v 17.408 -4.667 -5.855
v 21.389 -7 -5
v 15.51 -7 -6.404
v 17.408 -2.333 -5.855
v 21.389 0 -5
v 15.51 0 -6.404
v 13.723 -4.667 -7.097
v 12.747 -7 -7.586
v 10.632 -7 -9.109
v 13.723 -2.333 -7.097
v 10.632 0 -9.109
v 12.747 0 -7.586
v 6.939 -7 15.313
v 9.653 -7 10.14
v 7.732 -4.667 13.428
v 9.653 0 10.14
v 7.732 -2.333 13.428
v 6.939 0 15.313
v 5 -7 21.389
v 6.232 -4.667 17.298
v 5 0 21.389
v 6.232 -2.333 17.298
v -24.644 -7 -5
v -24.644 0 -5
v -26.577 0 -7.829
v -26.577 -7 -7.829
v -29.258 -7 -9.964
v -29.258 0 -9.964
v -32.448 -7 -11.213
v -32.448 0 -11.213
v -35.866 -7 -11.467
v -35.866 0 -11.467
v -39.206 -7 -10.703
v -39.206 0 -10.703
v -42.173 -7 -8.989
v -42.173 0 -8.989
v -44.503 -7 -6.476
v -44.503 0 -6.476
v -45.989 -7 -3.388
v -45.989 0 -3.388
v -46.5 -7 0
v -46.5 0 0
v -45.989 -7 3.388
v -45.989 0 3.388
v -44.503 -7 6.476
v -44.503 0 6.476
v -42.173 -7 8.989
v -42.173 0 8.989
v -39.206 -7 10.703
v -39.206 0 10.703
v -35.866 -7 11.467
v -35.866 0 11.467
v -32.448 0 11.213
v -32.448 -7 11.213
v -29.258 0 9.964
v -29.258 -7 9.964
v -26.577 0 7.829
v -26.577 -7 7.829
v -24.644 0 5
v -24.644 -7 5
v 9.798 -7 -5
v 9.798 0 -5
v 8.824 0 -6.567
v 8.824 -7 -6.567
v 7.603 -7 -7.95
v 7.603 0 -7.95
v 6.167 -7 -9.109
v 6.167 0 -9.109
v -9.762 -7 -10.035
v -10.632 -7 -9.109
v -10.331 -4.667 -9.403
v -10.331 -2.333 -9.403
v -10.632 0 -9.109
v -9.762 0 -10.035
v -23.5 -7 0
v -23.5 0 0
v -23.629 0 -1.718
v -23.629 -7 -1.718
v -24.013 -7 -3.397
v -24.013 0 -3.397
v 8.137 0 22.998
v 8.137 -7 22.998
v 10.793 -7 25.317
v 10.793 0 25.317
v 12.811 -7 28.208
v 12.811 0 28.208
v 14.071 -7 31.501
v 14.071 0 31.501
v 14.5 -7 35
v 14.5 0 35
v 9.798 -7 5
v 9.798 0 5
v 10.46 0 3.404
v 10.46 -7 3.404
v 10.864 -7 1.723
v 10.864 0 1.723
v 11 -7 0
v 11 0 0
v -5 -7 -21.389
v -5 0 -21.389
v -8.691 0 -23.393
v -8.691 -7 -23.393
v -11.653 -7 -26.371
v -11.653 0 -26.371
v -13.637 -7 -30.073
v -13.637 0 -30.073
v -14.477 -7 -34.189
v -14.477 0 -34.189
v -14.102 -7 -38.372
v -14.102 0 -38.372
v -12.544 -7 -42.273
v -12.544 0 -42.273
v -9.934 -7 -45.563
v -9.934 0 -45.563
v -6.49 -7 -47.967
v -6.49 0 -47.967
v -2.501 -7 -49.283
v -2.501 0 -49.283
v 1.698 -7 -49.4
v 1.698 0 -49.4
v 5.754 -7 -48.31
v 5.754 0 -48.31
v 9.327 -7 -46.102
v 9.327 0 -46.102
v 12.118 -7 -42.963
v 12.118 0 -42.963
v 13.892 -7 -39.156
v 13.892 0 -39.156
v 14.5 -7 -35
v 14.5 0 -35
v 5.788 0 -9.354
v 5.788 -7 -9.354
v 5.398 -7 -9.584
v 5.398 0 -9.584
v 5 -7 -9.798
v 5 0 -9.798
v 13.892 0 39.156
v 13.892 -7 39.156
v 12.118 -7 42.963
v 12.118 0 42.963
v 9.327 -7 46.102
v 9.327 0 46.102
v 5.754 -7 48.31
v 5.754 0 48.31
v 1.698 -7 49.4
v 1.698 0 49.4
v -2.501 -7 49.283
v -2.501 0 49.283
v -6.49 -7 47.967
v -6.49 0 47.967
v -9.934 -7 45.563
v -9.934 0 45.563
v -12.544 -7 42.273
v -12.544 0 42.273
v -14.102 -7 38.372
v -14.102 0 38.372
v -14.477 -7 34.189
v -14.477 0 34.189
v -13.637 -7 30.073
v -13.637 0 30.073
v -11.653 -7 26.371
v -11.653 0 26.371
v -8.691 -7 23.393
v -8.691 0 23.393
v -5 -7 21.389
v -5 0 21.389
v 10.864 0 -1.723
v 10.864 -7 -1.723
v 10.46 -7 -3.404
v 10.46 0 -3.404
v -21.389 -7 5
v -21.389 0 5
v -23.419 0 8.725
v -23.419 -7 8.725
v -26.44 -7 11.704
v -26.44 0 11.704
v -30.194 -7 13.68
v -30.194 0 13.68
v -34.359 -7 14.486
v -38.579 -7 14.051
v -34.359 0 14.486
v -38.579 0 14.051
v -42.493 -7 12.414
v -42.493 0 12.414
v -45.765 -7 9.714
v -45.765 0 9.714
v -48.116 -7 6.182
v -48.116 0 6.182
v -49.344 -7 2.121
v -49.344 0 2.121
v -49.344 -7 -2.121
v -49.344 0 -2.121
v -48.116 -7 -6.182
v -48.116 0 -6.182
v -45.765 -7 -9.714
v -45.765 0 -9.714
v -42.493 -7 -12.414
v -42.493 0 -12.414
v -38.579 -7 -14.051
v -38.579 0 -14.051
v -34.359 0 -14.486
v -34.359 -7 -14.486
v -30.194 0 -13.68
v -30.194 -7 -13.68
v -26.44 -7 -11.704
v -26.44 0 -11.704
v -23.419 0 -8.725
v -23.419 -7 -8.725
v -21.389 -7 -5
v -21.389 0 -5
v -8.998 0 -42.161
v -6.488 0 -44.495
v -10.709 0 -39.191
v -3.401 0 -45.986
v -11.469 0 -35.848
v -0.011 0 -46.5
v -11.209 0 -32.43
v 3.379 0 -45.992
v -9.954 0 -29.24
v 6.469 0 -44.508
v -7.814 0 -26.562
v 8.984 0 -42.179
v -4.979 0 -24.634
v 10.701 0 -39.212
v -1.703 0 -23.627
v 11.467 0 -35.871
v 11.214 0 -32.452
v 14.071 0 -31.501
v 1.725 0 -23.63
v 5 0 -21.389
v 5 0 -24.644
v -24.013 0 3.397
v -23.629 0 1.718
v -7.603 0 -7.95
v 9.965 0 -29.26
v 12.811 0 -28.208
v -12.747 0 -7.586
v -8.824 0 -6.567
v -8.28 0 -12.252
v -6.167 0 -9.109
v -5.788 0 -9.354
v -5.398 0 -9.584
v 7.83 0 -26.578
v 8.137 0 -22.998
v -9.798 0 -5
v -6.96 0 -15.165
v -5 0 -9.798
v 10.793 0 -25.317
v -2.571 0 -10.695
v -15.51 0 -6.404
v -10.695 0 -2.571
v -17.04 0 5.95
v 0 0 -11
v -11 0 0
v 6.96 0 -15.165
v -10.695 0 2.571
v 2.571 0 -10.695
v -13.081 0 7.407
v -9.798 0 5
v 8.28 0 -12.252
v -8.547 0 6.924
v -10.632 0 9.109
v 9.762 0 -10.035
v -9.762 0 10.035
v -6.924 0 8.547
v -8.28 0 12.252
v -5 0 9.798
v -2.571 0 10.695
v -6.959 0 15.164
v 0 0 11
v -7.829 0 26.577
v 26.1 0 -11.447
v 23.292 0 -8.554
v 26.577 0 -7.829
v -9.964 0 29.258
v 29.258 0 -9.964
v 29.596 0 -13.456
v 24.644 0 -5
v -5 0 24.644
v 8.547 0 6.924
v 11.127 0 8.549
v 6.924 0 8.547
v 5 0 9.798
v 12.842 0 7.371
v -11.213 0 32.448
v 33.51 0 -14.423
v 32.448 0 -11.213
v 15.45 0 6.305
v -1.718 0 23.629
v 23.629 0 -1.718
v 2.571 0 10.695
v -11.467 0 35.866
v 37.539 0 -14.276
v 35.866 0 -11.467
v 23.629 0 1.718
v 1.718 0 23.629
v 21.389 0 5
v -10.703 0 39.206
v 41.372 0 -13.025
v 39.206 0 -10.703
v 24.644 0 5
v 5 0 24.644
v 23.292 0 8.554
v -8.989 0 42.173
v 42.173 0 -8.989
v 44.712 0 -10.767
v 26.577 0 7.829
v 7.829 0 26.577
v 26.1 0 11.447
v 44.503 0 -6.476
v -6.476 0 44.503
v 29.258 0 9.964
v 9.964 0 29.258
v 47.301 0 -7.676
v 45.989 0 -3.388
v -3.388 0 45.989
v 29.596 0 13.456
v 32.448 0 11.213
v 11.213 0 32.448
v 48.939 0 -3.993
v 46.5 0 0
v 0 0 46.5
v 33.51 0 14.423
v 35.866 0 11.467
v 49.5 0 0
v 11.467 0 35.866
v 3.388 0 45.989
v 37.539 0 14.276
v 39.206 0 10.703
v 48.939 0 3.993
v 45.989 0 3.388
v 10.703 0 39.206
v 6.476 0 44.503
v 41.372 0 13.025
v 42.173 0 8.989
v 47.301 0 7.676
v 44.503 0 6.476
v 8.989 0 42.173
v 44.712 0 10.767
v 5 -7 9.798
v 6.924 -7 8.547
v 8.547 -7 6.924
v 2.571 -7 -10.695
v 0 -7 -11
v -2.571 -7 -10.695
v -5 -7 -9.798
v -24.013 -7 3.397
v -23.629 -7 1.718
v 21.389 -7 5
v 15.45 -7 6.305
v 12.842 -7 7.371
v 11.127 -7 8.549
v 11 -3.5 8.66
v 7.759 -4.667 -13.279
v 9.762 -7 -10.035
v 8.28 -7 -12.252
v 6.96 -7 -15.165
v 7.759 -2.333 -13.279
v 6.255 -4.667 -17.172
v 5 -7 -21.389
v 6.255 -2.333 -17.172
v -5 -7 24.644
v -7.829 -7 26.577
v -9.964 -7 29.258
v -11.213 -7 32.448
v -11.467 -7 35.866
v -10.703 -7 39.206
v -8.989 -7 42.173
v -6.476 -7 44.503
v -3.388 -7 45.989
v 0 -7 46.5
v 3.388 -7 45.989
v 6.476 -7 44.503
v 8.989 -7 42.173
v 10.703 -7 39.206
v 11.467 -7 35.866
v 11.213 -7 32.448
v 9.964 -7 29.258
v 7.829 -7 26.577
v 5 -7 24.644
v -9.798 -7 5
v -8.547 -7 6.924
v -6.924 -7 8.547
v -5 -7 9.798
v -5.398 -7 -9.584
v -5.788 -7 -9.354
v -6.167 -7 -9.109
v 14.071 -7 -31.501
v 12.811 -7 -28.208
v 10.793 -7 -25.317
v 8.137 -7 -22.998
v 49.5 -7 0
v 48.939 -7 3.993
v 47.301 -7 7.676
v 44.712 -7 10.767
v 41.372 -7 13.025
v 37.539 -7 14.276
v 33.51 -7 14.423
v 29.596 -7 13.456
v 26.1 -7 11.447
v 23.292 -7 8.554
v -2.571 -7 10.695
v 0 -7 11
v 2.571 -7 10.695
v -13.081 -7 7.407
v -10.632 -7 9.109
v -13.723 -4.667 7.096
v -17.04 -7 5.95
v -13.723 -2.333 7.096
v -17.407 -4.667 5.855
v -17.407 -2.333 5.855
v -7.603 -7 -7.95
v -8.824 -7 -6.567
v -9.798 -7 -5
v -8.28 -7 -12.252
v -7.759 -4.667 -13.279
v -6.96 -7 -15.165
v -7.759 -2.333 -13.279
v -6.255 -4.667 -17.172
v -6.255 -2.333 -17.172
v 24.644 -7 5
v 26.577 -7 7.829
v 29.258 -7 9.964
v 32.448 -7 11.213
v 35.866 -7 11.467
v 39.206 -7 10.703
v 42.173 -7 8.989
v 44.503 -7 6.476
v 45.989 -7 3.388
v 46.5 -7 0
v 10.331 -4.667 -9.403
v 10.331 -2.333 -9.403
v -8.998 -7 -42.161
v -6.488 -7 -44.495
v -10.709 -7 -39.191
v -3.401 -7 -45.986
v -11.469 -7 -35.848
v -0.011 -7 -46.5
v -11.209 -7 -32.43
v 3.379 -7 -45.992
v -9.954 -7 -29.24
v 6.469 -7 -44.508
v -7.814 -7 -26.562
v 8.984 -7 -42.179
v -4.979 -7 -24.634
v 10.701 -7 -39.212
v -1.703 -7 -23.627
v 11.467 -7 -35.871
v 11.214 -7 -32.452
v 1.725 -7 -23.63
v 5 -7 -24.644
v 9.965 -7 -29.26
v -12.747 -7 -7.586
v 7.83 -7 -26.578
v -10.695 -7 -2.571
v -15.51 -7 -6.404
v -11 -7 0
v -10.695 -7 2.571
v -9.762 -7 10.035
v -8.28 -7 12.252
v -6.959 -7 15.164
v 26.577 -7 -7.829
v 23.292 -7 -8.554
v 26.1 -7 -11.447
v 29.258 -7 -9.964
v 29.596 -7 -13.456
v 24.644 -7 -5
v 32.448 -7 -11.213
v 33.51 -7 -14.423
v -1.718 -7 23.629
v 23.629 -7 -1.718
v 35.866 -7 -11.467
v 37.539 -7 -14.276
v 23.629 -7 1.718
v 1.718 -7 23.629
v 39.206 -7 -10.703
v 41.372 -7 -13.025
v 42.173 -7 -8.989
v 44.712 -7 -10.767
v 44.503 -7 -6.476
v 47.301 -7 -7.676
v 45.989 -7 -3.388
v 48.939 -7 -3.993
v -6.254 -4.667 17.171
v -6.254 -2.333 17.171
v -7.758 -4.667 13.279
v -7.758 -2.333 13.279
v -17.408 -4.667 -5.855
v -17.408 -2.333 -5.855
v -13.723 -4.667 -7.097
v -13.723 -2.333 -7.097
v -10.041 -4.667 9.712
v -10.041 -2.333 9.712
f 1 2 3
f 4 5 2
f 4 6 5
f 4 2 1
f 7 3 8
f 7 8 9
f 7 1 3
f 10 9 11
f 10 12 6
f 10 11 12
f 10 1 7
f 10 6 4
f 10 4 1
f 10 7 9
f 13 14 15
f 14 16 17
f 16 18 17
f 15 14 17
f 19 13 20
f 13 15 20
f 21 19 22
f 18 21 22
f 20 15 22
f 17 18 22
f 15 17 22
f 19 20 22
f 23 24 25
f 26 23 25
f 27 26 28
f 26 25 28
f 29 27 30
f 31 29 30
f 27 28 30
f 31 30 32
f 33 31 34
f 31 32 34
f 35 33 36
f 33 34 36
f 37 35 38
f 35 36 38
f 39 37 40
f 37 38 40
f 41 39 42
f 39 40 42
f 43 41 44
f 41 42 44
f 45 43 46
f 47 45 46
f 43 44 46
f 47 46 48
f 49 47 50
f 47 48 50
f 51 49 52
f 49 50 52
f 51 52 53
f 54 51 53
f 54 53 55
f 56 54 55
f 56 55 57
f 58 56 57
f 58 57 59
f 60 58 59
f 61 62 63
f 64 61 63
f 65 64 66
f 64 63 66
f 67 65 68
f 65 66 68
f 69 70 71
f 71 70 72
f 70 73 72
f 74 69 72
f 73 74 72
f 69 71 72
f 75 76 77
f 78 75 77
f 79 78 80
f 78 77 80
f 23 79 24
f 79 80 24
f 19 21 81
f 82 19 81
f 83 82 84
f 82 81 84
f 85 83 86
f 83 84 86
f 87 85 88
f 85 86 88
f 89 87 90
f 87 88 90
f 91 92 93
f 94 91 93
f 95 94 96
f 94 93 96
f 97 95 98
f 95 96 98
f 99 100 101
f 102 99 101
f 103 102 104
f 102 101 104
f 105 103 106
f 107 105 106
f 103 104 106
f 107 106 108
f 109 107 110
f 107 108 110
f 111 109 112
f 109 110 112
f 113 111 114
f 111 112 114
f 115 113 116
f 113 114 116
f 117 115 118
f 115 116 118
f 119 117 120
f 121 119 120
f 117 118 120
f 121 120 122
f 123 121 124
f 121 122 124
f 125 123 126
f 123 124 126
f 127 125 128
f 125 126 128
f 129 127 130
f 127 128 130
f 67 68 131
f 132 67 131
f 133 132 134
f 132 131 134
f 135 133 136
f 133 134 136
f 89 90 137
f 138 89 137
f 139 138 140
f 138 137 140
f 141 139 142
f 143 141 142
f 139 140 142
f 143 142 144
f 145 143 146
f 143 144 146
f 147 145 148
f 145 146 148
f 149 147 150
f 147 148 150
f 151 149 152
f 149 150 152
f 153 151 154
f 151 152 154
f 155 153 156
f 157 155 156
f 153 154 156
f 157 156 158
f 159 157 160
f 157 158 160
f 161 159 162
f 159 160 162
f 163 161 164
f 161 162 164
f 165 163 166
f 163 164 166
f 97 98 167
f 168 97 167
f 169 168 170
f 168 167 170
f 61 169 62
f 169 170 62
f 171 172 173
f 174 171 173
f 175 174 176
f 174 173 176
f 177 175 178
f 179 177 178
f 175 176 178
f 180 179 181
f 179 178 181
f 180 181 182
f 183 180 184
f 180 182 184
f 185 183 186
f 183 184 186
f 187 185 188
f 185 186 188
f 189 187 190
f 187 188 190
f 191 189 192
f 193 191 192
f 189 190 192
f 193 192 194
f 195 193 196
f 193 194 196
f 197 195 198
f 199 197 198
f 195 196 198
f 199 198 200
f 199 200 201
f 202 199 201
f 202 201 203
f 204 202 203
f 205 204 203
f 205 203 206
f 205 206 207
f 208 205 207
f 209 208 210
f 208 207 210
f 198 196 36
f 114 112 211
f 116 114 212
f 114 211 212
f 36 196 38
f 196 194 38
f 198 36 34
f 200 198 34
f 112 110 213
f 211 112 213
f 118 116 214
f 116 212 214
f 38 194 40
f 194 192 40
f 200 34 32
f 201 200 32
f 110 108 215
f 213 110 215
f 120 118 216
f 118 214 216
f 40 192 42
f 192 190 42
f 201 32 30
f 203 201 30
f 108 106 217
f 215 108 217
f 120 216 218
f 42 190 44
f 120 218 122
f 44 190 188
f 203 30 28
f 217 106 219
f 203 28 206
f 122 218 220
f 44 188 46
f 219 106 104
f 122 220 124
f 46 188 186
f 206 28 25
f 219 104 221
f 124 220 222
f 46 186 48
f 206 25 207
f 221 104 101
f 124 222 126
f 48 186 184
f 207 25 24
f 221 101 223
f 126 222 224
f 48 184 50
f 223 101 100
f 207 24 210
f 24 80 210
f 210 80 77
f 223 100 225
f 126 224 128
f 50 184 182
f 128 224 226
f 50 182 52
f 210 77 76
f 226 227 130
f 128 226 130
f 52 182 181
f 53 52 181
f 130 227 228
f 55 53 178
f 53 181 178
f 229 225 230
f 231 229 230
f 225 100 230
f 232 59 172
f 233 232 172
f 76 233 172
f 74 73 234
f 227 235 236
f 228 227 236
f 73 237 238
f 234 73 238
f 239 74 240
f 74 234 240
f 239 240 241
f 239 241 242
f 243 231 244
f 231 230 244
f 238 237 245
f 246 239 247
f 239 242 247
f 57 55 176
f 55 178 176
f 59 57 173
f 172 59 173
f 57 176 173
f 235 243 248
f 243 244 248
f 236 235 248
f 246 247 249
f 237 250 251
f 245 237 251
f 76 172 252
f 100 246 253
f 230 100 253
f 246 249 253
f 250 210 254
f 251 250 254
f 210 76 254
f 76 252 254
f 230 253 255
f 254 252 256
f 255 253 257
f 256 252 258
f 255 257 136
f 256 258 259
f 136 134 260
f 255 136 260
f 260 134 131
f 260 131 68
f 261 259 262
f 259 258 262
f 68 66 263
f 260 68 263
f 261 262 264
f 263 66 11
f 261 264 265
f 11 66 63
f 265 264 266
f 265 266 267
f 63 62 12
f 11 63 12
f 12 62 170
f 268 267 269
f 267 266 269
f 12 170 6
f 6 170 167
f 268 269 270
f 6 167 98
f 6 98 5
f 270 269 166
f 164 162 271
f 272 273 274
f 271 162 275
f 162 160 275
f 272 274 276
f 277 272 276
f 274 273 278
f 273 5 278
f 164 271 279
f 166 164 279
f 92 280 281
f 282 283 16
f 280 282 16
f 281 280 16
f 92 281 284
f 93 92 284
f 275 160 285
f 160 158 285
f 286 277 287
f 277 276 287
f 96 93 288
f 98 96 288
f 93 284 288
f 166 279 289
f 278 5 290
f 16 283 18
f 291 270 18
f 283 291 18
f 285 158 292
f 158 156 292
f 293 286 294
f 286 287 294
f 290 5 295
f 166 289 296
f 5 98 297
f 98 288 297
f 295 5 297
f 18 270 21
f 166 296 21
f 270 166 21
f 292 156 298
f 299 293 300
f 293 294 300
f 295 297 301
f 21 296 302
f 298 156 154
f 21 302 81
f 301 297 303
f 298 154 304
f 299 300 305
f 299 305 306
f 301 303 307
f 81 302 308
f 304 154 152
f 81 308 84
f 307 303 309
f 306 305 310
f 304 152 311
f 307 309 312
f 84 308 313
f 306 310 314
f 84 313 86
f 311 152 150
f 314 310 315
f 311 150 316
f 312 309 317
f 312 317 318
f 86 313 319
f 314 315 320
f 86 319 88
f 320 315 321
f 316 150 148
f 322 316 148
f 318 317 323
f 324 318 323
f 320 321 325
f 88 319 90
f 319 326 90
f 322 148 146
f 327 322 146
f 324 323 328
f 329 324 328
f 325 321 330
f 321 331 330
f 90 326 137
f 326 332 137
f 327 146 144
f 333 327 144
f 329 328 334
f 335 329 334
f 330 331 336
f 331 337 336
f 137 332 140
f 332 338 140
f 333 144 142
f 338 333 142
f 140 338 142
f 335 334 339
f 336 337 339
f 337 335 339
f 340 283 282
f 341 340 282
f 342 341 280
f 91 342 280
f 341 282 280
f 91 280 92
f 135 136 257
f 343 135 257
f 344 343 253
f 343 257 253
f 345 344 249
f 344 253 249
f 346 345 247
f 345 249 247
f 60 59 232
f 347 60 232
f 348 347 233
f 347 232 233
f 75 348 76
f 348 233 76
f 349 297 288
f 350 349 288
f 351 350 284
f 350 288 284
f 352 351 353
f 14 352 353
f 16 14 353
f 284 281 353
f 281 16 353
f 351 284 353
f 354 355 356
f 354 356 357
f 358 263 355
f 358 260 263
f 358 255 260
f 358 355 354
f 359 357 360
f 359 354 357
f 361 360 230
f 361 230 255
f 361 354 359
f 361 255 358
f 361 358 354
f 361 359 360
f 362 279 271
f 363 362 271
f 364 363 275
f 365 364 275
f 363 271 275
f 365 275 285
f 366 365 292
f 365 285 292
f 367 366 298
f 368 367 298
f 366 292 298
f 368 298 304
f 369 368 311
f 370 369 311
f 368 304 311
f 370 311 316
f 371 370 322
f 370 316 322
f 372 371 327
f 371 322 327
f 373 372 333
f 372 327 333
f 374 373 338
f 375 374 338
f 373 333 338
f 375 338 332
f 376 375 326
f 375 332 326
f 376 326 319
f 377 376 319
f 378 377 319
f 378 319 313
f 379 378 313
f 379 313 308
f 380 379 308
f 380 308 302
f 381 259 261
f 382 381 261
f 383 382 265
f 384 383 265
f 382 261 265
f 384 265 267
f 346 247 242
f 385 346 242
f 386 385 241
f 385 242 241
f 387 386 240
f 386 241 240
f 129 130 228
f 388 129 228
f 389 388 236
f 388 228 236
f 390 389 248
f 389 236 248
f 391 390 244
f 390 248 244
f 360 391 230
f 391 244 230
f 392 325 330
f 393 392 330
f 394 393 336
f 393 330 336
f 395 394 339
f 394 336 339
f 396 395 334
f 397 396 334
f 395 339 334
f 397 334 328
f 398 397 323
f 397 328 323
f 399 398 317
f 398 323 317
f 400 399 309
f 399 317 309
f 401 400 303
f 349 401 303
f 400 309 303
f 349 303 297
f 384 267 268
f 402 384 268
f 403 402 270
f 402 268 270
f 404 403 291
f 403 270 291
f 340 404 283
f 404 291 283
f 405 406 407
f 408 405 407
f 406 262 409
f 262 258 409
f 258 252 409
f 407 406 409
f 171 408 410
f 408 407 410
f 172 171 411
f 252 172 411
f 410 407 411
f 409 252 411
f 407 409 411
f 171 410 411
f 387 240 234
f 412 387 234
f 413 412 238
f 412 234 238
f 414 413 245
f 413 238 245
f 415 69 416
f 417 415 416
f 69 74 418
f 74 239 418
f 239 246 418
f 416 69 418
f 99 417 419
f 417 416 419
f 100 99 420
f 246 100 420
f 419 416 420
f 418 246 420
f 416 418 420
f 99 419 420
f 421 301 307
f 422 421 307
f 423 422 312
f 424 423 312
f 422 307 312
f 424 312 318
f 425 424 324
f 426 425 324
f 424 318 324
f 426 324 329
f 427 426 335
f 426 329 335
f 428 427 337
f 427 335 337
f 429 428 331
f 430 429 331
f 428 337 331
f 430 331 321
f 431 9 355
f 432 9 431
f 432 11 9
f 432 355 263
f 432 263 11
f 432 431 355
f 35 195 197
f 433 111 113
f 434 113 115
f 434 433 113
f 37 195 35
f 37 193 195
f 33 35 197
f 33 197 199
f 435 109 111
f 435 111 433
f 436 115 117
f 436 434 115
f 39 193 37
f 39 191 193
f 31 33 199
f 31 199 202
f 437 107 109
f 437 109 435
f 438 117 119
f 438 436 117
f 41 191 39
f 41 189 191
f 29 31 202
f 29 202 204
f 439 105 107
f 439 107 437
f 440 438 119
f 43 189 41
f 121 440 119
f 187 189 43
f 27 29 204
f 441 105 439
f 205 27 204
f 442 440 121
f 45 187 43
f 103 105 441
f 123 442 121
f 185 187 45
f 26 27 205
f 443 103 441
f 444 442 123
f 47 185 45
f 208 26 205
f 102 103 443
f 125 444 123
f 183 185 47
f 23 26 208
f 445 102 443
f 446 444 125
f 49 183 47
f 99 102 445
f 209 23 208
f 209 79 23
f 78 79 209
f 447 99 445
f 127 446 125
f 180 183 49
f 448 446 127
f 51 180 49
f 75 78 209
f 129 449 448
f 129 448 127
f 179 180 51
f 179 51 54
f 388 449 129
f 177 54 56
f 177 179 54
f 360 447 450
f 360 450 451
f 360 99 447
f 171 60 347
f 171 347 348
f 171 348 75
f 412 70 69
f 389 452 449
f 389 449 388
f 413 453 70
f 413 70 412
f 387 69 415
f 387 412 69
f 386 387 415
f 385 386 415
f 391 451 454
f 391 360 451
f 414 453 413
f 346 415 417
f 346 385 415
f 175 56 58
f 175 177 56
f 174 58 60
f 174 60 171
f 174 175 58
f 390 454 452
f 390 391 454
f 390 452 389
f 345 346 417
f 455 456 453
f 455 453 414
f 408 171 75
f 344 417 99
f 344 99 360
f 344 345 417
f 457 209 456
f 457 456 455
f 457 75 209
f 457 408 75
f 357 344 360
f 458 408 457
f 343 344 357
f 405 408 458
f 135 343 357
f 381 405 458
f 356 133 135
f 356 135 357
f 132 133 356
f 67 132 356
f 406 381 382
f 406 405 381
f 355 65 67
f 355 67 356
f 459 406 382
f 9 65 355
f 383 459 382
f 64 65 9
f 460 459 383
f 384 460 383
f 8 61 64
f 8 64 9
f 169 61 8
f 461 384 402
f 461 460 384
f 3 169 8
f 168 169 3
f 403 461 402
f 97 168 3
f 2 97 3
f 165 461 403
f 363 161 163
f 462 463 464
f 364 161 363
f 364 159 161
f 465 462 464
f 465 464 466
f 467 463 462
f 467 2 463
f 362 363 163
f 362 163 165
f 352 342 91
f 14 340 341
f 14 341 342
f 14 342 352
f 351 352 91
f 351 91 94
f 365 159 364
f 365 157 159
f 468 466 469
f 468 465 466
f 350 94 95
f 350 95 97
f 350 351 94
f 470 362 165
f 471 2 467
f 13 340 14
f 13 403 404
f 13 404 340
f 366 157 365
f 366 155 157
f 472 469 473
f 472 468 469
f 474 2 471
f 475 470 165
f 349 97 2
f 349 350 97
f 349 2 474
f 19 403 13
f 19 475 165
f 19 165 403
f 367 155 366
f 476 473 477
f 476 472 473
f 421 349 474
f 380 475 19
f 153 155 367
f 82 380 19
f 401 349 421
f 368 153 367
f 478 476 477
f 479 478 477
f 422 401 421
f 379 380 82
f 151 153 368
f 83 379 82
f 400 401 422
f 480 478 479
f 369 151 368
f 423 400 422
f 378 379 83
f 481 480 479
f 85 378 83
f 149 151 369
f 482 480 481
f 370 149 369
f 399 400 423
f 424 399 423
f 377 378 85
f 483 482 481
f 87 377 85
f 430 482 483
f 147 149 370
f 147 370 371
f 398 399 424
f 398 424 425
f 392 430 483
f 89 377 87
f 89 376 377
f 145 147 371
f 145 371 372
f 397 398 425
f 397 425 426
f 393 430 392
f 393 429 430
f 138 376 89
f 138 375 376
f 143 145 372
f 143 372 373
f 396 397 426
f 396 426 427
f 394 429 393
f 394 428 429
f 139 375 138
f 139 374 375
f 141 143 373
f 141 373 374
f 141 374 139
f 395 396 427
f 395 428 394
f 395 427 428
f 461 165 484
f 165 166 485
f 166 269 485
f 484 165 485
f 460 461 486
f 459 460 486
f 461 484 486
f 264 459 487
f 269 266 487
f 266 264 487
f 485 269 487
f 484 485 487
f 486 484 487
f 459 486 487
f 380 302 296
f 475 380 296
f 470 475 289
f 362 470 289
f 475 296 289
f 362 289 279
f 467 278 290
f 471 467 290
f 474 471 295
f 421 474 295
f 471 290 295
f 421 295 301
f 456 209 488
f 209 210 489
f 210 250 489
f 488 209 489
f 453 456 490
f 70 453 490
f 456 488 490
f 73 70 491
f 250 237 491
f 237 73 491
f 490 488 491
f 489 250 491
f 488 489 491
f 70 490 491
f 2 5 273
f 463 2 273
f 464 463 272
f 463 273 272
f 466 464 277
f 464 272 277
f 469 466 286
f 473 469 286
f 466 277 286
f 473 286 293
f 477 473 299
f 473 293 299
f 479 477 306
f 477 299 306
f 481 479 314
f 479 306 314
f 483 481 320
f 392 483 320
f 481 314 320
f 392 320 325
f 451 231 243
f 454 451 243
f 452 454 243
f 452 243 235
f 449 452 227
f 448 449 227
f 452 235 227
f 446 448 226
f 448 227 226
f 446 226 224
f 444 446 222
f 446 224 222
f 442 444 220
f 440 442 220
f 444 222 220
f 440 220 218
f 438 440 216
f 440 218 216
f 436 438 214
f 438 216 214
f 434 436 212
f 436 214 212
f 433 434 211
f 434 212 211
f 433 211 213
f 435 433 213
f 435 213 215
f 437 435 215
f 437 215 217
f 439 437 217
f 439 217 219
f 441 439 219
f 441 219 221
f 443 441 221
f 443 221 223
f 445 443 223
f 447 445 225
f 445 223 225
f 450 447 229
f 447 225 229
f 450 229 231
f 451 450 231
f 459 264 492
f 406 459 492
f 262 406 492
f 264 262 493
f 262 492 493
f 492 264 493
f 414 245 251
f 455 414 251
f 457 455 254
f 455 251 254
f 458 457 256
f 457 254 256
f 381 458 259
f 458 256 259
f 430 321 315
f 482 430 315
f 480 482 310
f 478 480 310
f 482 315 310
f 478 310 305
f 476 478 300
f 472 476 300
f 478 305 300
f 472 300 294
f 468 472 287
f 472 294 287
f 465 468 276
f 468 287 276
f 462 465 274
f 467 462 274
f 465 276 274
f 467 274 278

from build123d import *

# Parameters (mm, degrees)
F1_DEPTH = 7


with BuildPart() as f1:
    # F0 (on Front) → F1 (new body)
    with BuildSketch(Plane.XZ):
        with BuildLine():
            ThreePointArc((9.7979589711, 5), (10.695268783, 2.5712303784), (11, 0))
            ThreePointArc((11, 0), (10.695268783, -2.5712303784), (9.7979589711, -5))
            Line((9.7979589711, -5), (13.0766968306, -5))
            ThreePointArc((13.0766968306, -5), (13.7672392953, -2.542267135), (14, 0))
            ThreePointArc((14, 0), (13.7672392953, 2.542267135), (13.0766968306, 5))
            Line((13.0766968306, 5), (9.7979589711, 5))
        make_face()
        with BuildLine():
            ThreePointArc((5, 9.7979589711), (7.7781745931, 7.7781745931), (9.7979589711, 5))
            Line((9.7979589711, 5), (13.0766968306, 5))
            ThreePointArc((13.0766968306, 5), (12.1766661067, 6.9086035149), (11, 8.6602540378))
            add(Edge.make_bspline(
                [(11, 8.6602540378), (10.5165329788, 9.0943534866), (10.069073109, 9.5914231948), (9.6528657807, 10.1401273276)],
                knots=[0.4694223133, 0.4694223133, 0.4694223133, 0.4694223133, 0.5544432682, 0.5544432682, 0.5544432682, 0.5544432682], degree=3))
            ThreePointArc((9.6528657807, 10.1401273276), (7.4721134232, 11.8392365037), (5, 13.0766968306))
            Line((5, 13.0766968306), (5, 9.7979589711))
        make_face()
        with BuildLine():
            Line((13.0766968306, -5), (9.7979589711, -5))
            ThreePointArc((9.7979589711, -5), (8.2425593884, -7.2842442798), (6.166922169, -9.1087359694))
            Line((6.166922169, -9.1087359694), (10.6316004928, -9.1087359694))
            ThreePointArc((10.6316004928, -9.1087359694), (12.0308465334, -7.1595203533), (13.0766968306, -5))
        make_face()
        with BuildLine():
            ThreePointArc((-5, 9.7979589711), (0, 11), (5, 9.7979589711))
            Line((5, 9.7979589711), (5, 13.0766968306))
            ThreePointArc((5, 13.0766968306), (0, 14), (-5, 13.0766968306))
            Line((-5, 13.0766968306), (-5, 9.7979589711))
        make_face()
        with BuildLine():
            ThreePointArc((11, 8.6602540378), (12.1766661067, 6.9086035149), (13.0766968306, 5))
            Line((13.0766968306, 5), (21.3893424112, 5))
            add(Edge.make_bspline(
                [(21.3893424112, 5), (17.4363397181, 5.7863082094), (13.6693443727, 6.2634805868), (11, 8.6602540378)],
                knots=[0, 0, 0, 0, 0.4694223133, 0.4694223133, 0.4694223133, 0.4694223133], degree=3))
        make_face()
        with BuildLine():
            Line((21.3893424112, 5), (13.0766968306, 5))
            ThreePointArc((13.0766968306, 5), (13.7672392953, 2.542267135), (14, 0))
            ThreePointArc((14, 0), (13.7672392953, -2.542267135), (13.0766968306, -5))
            Line((13.0766968306, -5), (21.3893424112, -5))
            ThreePointArc((21.3893424112, -5), (20.5, 0), (21.3893424112, 5))
        make_face()
        with BuildLine():
            Line((10.6316004928, -9.1087359694), (6.166922169, -9.1087359694))
            ThreePointArc((6.166922169, -9.1087359694), (5.5940856955, -9.4713359792), (5, -9.7979589711))
            Line((5, -9.7979589711), (5, -13.0766968306))
            ThreePointArc((5, -13.0766968306), (7.5360949415, -11.7986131826), (9.7620843684, -10.0350241048))
            add(Edge.make_bspline(
                [(10.6316004928, -9.1087359694), (10.3251306555, -9.395868762), (10.035894736, -9.7054154416), (9.7620843684, -10.0350241048)],
                knots=[0.4800426808, 0.4800426808, 0.4800426808, 0.4800426808, 0.5346021309, 0.5346021309, 0.5346021309, 0.5346021309], degree=3))
        make_face()
        with BuildLine():
            Line((21.3893424112, -5), (13.0766968306, -5))
            ThreePointArc((13.0766968306, -5), (12.0308465334, -7.1595203533), (10.6316004928, -9.1087359694))
            add(Edge.make_bspline(
                [(21.3893424112, -5), (17.3587127001, -5.7911954717), (13.3280829889, -6.5823909435), (10.6316004928, -9.1087359694)],
                knots=[0, 0, 0, 0, 0.4800426808, 0.4800426808, 0.4800426808, 0.4800426808], degree=3))
        make_face()
        with BuildLine():
            ThreePointArc((-9.7979589711, 5), (-7.7781745931, 7.7781745931), (-5, 9.7979589711))
            Line((-5, 9.7979589711), (-5, 13.0766968306))
            ThreePointArc((-5, 13.0766968306), (-7.5358238199, 11.798786351), (-9.7616231696, 10.0354727389))
            add(Edge.make_bspline(
                [(-9.7616231696, 10.0354727389), (-10.0355905847, 9.7057125821), (-10.3249817585, 9.3960175313), (-10.6316004928, 9.1087359694)],
                knots=[0.4653704717, 0.4653704717, 0.4653704717, 0.4653704717, 0.5199573192, 0.5199573192, 0.5199573192, 0.5199573192], degree=3))
            ThreePointArc((-10.6316004928, 9.1087359694), (-12.0308465334, 7.1595203533), (-13.0766968306, 5))
            Line((-13.0766968306, 5), (-9.7979589711, 5))
        make_face()
        with BuildLine():
            ThreePointArc((-5, 13.0766968306), (0, 14), (5, 13.0766968306))
            Line((5, 13.0766968306), (5, 21.3893424112))
            ThreePointArc((5, 21.3893424112), (0, 20.5), (-5, 21.3893424112))
            Line((-5, 21.3893424112), (-5, 13.0766968306))
        make_face()
        with BuildLine():
            Line((5, 21.3893424112), (5, 13.0766968306))
            ThreePointArc((5, 13.0766968306), (7.4721134232, 11.8392365037), (9.6528657807, 10.1401273276))
            add(Edge.make_bspline(
                [(9.6528657807, 10.1401273276), (7.4717096508, 13.0156398459), (6.1488540964, 17.3092084385), (5, 21.3893424112)],
                knots=[0.5544432682, 0.5544432682, 0.5544432682, 0.5544432682, 1, 1, 1, 1], degree=3))
        make_face()
        with BuildLine():
            ThreePointArc((49.5, 0), (37.5392385632, 14.2759331576), (21.3893424112, 5))
            Line((21.3893424112, 5), (24.6438424114, 5))
            ThreePointArc((24.6438424114, 5), (37.5645845405, 11.2103927734), (46.5, 0))
            ThreePointArc((46.5, 0), (37.5645845405, -11.2103927734), (24.6438424114, -5))
            Line((24.6438424114, -5), (21.3893424112, -5))
            ThreePointArc((21.3893424112, -5), (37.5392385632, -14.2759331576), (49.5, 0))
        make_face()
        with BuildLine():
            Line((24.6438424114, 5), (21.3893424112, 5))
            ThreePointArc((21.3893424112, 5), (20.5, 0), (21.3893424112, -5))
            Line((21.3893424112, -5), (24.6438424114, -5))
            ThreePointArc((24.6438424114, -5), (23.5, 0), (24.6438424114, 5))
        make_face()
        with BuildLine():
            Line((5, -13.0766968306), (5, -9.7979589711))
            ThreePointArc((5, -9.7979589711), (0, -11), (-5, -9.7979589711))
            Line((-5, -9.7979589711), (-5, -13.0766968306))
            ThreePointArc((-5, -13.0766968306), (0, -14), (5, -13.0766968306))
        make_face()
        with BuildLine():
            ThreePointArc((-9.7979589711, -5), (-11, 0), (-9.7979589711, 5))
            Line((-9.7979589711, 5), (-13.0766968306, 5))
            ThreePointArc((-13.0766968306, 5), (-14, 0), (-13.0766968306, -5))
            Line((-13.0766968306, -5), (-9.7979589711, -5))
        make_face()
        with BuildLine():
            ThreePointArc((-9.7616231696, 10.0354727389), (-7.5358238199, 11.798786351), (-5, 13.0766968306))
            Line((-5, 13.0766968306), (-5, 21.3893424112))
            add(Edge.make_bspline(
                [(-5, 21.3893424112), (-6.2113181827, 17.1164504192), (-7.4259626407, 12.8467843762), (-9.7616231696, 10.0354727389)],
                knots=[0, 0, 0, 0, 0.4653704717, 0.4653704717, 0.4653704717, 0.4653704717], degree=3))
        make_face()
        with BuildLine():
            ThreePointArc((-5, 21.3893424112), (0, 20.5), (5, 21.3893424112))
            Line((5, 21.3893424112), (5, 24.6438424114))
            ThreePointArc((5, 24.6438424114), (0, 23.5), (-5, 24.6438424114))
            Line((-5, 24.6438424114), (-5, 21.3893424112))
        make_face()
        with BuildLine():
            Line((5, 24.6438424114), (5, 21.3893424112))
            ThreePointArc((5, 21.3893424112), (11.8901219506, 26.7009036637), (14.5, 35))
            ThreePointArc((14.5, 35), (-8.2990963363, 46.8901219506), (-5, 21.3893424112))
            Line((-5, 21.3893424112), (-5, 24.6438424114))
            ThreePointArc((-5, 24.6438424114), (-6.1135096303, 44.7403798694), (11.5, 35))
            ThreePointArc((11.5, 35), (9.7403798694, 28.8864903697), (5, 24.6438424114))
        make_face()
        with BuildLine():
            Line((-5, -13.0766968306), (-5, -9.7979589711))
            ThreePointArc((-5, -9.7979589711), (-5.5940856955, -9.4713359792), (-6.166922169, -9.1087359694))
            Line((-6.166922169, -9.1087359694), (-10.6316004928, -9.1087359694))
            add(Edge.make_bspline(
                [(-10.6316004928, -9.1087359694), (-10.3251306555, -9.395868762), (-10.035894736, -9.7054154416), (-9.7620843684, -10.0350241048)],
                knots=[0.4800426808, 0.4800426808, 0.4800426808, 0.4800426808, 0.5346021309, 0.5346021309, 0.5346021309, 0.5346021309], degree=3))
            ThreePointArc((-9.7620843684, -10.0350241048), (-7.5360949415, -11.7986131826), (-5, -13.0766968306))
        make_face()
        with BuildLine():
            ThreePointArc((9.7620843684, -10.0350241048), (7.5360949415, -11.7986131826), (5, -13.0766968306))
            Line((5, -13.0766968306), (5, -21.3893424112))
            add(Edge.make_bspline(
                [(9.7620843684, -10.0350241048), (7.4264530295, -12.8466207961), (6.2132265148, -17.1179816036), (5, -21.3893424112)],
                knots=[0.5346021309, 0.5346021309, 0.5346021309, 0.5346021309, 1, 1, 1, 1], degree=3))
        make_face()
        with BuildLine():
            Line((5, -21.3893424112), (5, -13.0766968306))
            ThreePointArc((5, -13.0766968306), (0, -14), (-5, -13.0766968306))
            Line((-5, -13.0766968306), (-5, -21.3893424112))
            ThreePointArc((-5, -21.3893424112), (0, -20.5), (5, -21.3893424112))
        make_face()
        with BuildLine():
            ThreePointArc((-6.166922169, -9.1087359694), (-8.2425593884, -7.2842442798), (-9.7979589711, -5))
            Line((-9.7979589711, -5), (-13.0766968306, -5))
            ThreePointArc((-13.0766968306, -5), (-12.0308465334, -7.1595203533), (-10.6316004928, -9.1087359694))
            Line((-10.6316004928, -9.1087359694), (-6.166922169, -9.1087359694))
        make_face()
        with BuildLine():
            ThreePointArc((-13.0766968306, -5), (-14, 0), (-13.0766968306, 5))
            Line((-13.0766968306, 5), (-21.3893424112, 5))
            ThreePointArc((-21.3893424112, 5), (-20.7240668424, 2.5392385632), (-20.5, 0))
            ThreePointArc((-20.5, 0), (-20.7240668424, -2.5392385632), (-21.3893424112, -5))
            Line((-21.3893424112, -5), (-13.0766968306, -5))
        make_face()
        with BuildLine():
            Line((-21.3893424112, 5), (-13.0766968306, 5))
            ThreePointArc((-13.0766968306, 5), (-12.0308465334, 7.1595203533), (-10.6316004928, 9.1087359694))
            add(Edge.make_bspline(
                [(-10.6316004928, 9.1087359694), (-13.3280390276, 6.5823506348), (-17.3567942358, 5.789342747), (-21.3893424112, 5)],
                knots=[0.5199573192, 0.5199573192, 0.5199573192, 0.5199573192, 1, 1, 1, 1], degree=3))
        make_face()
        with BuildLine():
            Line((-5, -21.3893424112), (-5, -13.0766968306))
            ThreePointArc((-5, -13.0766968306), (-7.5360949415, -11.7986131826), (-9.7620843684, -10.0350241048))
            add(Edge.make_bspline(
                [(-9.7620843684, -10.0350241048), (-7.4264530295, -12.8466207961), (-6.2132265148, -17.1179816036), (-5, -21.3893424112)],
                knots=[0.5346021309, 0.5346021309, 0.5346021309, 0.5346021309, 1, 1, 1, 1], degree=3))
        make_face()
        with BuildLine():
            ThreePointArc((14.5, -35), (11.8901219506, -26.7009036637), (5, -21.3893424112))
            Line((5, -21.3893424112), (5, -24.6438424114))
            ThreePointArc((5, -24.6438424114), (9.7403798694, -28.8864903697), (11.5, -35))
            ThreePointArc((11.5, -35), (-6.1135096303, -44.7403798694), (-5, -24.6438424114))
            Line((-5, -24.6438424114), (-5, -21.3893424112))
            ThreePointArc((-5, -21.3893424112), (-8.2990963363, -46.8901219506), (14.5, -35))
        make_face()
        with BuildLine():
            Line((5, -24.6438424114), (5, -21.3893424112))
            ThreePointArc((5, -21.3893424112), (0, -20.5), (-5, -21.3893424112))
            Line((-5, -21.3893424112), (-5, -24.6438424114))
            ThreePointArc((-5, -24.6438424114), (0, -23.5), (5, -24.6438424114))
        make_face()
        with BuildLine():
            ThreePointArc((-10.6316004928, -9.1087359694), (-12.0308465334, -7.1595203533), (-13.0766968306, -5))
            Line((-13.0766968306, -5), (-21.3893424112, -5))
            add(Edge.make_bspline(
                [(-21.3893424112, -5), (-17.3587127001, -5.7911954717), (-13.3280829889, -6.5823909435), (-10.6316004928, -9.1087359694)],
                knots=[0, 0, 0, 0, 0.4800426808, 0.4800426808, 0.4800426808, 0.4800426808], degree=3))
        make_face()
        with BuildLine():
            ThreePointArc((-20.5, 0), (-20.7240668424, 2.5392385632), (-21.3893424112, 5))
            Line((-21.3893424112, 5), (-24.6438424114, 5))
            ThreePointArc((-24.6438424114, 5), (-23.7896072266, 2.5645845405), (-23.5, 0))
            ThreePointArc((-23.5, 0), (-23.7896072266, -2.5645845405), (-24.6438424114, -5))
            Line((-24.6438424114, -5), (-21.3893424112, -5))
            ThreePointArc((-21.3893424112, -5), (-20.7240668424, -2.5392385632), (-20.5, 0))
        make_face()
        with BuildLine():
            Line((-24.6438424114, 5), (-21.3893424112, 5))
            ThreePointArc((-21.3893424112, 5), (-49.5, 0), (-21.3893424112, -5))
            Line((-21.3893424112, -5), (-24.6438424114, -5))
            ThreePointArc((-24.6438424114, -5), (-46.5, 0), (-24.6438424114, 5))
        make_face()
    extrude(amount=F1_DEPTH)


solid = f1.part
